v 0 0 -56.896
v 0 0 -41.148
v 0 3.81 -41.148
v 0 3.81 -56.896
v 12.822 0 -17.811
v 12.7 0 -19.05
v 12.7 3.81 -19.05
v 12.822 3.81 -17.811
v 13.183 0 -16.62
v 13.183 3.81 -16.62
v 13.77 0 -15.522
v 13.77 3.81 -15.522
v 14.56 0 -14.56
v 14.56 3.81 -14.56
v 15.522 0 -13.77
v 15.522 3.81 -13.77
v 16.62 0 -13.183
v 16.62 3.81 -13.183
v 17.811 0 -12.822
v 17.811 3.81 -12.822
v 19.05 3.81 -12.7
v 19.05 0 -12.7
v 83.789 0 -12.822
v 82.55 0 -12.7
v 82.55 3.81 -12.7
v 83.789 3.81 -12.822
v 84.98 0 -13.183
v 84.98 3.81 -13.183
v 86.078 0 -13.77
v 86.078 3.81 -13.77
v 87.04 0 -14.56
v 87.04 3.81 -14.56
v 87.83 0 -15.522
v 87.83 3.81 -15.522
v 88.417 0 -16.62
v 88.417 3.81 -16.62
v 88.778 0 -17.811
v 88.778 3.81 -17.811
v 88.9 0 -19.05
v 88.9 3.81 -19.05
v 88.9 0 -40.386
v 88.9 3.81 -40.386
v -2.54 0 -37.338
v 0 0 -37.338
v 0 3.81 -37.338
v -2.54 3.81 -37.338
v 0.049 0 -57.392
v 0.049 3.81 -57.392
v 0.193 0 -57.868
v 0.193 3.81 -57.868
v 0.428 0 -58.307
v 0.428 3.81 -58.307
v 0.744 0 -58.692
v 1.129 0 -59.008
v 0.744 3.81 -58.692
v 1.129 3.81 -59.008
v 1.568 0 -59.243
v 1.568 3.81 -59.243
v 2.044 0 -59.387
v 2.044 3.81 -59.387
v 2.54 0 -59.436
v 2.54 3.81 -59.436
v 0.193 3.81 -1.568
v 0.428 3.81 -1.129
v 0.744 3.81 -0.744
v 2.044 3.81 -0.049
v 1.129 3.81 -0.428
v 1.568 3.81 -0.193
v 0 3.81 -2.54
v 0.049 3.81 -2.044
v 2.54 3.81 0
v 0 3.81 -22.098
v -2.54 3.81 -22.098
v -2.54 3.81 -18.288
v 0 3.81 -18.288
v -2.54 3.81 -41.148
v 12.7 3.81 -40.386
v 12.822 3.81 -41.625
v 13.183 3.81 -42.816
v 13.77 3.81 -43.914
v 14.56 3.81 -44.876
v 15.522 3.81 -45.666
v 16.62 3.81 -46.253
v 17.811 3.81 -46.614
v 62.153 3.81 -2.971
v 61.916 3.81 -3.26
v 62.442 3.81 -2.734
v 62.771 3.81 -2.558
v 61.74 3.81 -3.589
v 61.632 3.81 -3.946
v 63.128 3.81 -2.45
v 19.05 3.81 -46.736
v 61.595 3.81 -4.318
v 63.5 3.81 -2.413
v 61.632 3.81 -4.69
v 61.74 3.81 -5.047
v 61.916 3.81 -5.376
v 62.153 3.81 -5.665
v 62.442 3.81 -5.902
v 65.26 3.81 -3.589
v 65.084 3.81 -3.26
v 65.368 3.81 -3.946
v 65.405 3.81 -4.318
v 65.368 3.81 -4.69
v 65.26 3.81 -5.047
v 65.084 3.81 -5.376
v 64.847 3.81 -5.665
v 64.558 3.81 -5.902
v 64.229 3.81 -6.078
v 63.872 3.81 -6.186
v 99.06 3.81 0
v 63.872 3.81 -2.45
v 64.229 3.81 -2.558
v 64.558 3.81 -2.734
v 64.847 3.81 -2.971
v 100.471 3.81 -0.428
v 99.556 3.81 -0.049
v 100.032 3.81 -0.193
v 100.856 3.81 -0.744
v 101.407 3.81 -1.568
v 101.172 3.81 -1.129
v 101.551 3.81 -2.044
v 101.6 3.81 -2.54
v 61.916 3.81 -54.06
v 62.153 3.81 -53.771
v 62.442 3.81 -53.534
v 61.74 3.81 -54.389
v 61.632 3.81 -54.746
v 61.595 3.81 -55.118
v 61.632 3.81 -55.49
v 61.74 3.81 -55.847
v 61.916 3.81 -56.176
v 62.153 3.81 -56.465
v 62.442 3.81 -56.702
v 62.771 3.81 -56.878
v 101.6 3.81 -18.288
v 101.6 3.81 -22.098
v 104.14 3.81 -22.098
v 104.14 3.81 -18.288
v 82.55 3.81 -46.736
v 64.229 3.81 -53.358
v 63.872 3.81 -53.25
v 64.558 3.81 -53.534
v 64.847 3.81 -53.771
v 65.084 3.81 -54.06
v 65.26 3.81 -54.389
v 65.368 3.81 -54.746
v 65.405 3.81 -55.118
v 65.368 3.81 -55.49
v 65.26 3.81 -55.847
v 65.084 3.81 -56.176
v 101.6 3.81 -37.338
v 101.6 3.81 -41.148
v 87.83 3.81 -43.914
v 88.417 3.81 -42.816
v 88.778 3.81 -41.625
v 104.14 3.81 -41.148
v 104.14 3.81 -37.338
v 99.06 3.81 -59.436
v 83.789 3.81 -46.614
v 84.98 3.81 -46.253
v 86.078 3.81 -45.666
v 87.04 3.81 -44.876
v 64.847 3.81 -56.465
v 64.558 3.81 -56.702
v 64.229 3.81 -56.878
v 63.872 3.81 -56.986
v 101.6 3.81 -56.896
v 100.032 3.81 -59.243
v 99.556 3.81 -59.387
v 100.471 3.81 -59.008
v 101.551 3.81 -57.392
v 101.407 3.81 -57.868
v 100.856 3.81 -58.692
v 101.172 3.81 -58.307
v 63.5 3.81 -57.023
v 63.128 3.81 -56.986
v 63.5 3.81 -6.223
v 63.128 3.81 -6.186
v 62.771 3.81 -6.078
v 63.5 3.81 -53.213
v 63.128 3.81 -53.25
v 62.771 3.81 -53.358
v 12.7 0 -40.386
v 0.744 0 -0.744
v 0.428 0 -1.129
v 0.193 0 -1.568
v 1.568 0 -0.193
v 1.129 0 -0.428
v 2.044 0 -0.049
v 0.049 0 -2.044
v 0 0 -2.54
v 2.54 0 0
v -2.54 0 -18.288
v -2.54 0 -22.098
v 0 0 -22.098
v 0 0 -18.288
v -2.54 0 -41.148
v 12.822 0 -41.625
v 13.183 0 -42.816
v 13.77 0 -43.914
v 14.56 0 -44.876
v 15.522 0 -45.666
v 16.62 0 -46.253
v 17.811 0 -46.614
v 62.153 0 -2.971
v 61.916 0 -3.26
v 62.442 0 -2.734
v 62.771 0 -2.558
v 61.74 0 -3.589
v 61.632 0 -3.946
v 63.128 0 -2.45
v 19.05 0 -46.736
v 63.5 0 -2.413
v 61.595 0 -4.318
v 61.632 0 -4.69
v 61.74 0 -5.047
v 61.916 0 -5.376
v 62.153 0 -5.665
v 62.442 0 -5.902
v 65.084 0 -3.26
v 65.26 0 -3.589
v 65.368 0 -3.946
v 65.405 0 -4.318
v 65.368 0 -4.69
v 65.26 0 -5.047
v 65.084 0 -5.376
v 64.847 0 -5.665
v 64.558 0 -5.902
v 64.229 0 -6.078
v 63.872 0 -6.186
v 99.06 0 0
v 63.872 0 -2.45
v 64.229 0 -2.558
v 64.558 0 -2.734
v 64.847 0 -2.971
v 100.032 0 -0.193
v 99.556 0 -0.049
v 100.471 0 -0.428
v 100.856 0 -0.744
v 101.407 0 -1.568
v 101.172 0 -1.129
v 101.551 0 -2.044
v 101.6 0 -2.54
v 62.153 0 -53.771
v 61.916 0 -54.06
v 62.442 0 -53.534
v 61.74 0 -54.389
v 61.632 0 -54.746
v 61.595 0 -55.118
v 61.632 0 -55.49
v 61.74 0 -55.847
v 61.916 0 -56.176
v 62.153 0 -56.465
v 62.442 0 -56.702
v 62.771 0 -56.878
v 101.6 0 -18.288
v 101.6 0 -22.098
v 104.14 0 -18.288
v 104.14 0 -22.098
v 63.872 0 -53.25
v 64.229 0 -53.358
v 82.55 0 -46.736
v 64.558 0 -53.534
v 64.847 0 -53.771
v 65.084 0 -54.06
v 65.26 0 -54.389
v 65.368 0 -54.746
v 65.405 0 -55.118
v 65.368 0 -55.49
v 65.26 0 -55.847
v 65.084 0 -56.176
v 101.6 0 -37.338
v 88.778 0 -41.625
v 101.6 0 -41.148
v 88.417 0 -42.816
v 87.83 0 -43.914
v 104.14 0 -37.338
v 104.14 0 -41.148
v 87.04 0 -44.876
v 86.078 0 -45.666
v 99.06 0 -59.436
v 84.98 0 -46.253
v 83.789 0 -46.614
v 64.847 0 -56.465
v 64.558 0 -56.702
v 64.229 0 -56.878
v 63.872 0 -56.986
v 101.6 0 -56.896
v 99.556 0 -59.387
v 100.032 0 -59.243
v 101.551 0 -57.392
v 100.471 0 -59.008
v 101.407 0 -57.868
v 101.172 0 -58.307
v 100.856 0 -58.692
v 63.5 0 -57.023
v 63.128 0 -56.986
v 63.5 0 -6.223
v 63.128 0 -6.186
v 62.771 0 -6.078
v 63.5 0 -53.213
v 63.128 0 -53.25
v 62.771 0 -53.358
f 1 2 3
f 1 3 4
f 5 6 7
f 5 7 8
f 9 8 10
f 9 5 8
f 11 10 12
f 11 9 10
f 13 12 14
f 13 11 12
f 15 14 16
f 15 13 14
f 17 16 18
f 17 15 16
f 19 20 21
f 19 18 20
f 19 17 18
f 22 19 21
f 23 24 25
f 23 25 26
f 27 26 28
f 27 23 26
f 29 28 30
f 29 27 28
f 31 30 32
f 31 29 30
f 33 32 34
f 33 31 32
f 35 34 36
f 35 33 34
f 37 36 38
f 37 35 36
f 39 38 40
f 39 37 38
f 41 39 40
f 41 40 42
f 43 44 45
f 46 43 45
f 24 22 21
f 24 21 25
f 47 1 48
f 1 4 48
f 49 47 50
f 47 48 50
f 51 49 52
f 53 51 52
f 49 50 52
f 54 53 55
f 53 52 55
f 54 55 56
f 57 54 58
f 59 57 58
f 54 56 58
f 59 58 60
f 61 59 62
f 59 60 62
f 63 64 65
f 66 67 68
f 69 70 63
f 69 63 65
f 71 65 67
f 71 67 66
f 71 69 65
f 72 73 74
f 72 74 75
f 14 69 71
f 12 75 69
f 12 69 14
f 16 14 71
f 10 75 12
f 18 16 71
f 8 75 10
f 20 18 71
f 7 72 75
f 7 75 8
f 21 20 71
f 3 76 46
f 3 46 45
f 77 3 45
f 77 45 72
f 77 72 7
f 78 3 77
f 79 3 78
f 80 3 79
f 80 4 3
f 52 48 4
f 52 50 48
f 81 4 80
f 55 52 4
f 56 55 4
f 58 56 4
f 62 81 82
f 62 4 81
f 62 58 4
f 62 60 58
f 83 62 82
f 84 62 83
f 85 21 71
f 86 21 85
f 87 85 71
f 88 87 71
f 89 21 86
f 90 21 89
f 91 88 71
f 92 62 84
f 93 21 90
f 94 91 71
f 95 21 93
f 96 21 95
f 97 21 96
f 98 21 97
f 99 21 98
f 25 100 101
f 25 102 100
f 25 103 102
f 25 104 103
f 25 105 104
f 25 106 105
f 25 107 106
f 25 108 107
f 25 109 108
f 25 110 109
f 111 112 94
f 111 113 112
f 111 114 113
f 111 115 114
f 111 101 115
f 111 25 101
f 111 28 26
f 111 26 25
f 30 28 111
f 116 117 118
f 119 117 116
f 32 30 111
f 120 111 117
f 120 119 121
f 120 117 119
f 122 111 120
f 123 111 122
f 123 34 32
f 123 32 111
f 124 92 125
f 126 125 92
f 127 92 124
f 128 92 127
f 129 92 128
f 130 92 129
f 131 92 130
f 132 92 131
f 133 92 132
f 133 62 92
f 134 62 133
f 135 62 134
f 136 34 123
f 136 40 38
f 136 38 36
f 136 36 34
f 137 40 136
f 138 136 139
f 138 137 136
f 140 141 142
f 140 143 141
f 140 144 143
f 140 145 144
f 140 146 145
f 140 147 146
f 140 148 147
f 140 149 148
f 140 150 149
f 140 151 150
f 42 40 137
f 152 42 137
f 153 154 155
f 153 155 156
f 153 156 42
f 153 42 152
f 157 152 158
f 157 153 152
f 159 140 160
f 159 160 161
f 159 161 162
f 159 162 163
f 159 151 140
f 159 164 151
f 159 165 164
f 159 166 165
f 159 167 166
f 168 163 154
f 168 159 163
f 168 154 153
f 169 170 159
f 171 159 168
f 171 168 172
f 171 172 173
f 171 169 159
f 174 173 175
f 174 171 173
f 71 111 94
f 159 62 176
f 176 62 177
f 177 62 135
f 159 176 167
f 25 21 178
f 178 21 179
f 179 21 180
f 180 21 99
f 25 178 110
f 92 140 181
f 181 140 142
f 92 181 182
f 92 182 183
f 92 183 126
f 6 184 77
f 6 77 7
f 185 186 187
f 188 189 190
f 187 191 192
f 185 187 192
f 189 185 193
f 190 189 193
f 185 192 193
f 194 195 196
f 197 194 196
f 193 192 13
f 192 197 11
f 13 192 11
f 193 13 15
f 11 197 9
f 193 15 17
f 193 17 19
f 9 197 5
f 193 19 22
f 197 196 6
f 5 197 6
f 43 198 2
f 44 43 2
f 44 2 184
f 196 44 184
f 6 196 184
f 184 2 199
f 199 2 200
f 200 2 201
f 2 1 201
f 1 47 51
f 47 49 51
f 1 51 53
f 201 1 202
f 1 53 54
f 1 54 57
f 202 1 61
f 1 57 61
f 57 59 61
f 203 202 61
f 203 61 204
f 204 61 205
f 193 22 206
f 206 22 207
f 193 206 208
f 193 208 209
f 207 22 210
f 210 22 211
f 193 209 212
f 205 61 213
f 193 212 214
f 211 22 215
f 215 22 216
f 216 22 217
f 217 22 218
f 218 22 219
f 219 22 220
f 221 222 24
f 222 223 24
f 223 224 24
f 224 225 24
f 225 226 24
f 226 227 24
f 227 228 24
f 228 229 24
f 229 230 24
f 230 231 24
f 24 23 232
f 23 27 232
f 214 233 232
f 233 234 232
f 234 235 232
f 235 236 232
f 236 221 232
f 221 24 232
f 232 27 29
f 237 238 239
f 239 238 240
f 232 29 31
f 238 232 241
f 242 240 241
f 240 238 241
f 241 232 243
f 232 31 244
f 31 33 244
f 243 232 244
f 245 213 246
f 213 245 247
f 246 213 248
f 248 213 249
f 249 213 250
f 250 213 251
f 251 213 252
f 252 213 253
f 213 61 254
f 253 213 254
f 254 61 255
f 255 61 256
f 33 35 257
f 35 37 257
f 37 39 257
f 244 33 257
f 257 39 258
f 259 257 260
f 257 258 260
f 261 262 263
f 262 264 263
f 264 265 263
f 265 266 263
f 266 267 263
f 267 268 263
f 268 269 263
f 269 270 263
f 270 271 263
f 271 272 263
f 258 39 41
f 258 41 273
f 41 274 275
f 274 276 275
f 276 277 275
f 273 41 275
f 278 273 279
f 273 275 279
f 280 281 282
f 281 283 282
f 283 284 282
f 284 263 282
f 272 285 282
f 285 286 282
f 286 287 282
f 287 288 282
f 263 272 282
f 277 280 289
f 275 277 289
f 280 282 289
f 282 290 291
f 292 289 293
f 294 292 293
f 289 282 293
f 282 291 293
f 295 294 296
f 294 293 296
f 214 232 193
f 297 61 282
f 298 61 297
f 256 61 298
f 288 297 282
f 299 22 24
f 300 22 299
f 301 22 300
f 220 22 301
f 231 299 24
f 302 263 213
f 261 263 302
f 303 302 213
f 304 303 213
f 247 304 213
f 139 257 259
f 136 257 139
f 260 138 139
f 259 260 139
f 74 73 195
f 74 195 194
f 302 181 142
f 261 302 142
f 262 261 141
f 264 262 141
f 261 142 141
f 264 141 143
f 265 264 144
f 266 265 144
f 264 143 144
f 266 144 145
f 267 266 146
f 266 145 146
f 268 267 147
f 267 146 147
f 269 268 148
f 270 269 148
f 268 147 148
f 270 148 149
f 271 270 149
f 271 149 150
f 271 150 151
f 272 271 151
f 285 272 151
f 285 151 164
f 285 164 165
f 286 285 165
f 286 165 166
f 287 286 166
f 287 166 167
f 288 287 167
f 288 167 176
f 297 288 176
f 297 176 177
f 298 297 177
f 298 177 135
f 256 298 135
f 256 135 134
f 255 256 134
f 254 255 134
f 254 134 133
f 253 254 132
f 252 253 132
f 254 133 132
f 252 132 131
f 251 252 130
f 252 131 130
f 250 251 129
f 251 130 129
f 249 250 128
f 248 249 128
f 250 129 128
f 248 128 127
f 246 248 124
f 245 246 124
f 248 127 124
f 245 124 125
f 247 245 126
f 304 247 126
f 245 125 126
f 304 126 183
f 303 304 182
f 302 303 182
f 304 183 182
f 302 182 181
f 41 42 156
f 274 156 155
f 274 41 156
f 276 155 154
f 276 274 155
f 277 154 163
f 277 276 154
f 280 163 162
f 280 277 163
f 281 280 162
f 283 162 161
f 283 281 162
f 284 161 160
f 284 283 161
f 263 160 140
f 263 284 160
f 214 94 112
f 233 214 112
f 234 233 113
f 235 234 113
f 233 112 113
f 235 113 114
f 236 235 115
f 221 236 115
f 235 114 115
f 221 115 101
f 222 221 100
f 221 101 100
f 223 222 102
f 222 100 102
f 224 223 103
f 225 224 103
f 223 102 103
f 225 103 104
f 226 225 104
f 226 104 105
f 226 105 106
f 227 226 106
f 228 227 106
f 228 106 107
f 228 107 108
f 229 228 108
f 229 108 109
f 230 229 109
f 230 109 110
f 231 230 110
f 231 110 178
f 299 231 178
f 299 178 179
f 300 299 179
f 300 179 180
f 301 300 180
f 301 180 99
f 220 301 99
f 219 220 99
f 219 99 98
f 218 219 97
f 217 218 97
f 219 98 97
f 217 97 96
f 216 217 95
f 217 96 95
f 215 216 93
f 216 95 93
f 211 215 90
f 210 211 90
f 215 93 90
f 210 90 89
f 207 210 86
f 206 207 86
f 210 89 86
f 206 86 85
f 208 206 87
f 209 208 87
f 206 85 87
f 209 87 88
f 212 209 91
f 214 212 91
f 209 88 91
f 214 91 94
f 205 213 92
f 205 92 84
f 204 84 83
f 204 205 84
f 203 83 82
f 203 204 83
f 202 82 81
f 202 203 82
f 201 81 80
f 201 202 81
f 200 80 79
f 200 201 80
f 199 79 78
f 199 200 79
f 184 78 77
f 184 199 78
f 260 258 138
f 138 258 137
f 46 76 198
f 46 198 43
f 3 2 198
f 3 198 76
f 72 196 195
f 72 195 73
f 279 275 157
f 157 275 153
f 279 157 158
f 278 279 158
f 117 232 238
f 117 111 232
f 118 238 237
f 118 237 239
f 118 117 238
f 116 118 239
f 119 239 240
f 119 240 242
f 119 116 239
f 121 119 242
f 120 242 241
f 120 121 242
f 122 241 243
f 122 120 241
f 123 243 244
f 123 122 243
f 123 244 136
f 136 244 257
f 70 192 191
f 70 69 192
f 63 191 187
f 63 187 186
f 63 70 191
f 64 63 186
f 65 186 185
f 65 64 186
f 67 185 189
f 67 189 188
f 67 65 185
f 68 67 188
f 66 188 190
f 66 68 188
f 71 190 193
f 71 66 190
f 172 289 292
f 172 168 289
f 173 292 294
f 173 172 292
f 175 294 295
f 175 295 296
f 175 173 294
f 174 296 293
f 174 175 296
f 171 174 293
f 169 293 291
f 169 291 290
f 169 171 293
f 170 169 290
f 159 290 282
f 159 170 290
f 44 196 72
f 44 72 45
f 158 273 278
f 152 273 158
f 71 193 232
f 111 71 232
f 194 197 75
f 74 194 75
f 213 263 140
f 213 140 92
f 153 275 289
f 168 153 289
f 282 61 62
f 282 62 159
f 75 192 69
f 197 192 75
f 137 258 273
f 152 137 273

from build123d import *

# Parameters (mm, degrees)
SKETCH1_W                       = 101.6
SKETCH1_H                       = 59.436
BASE_EXTRUDE_DEPTH              = 3.81
BASE_CORNER_FILLET_R            = 2.54
SKETCH3_W                       = 3.81
SKETCH3_H                       = 3.81
PEG_EXTRUDE_DEPTH               = 2.54
MATERIAL_REMOVAL_CUT_DEPTH      = 120.96788652
SKETCH5_R                       = 1.905
REMOTE_CONTROL_HOLDER_CUT_DEPTH = 120.96788652


with BuildPart() as part:
    # Sketch1 → Base Extrude (new body)
    with BuildSketch(Plane(origin=(0, 0, 0), x_dir=(1, 0, 0), z_dir=(0, 1, 0))):
        with Locations((50.8, 29.718)):
            Rectangle(SKETCH1_W, SKETCH1_H)
    extrude(amount=BASE_EXTRUDE_DEPTH)

    # Base Corner Fillet
    base_corner_fillet_edges = [part.edges().sort_by_distance(p)[0] for p in [
        (0, 1.905, -59.436),
        (101.6, 1.905, -59.436),
        (101.6, 1.905, 0),
        (0, 1.905, 0),
    ]]
    fillet(base_corner_fillet_edges, radius=BASE_CORNER_FILLET_R)

    # Sketch3 → Peg Extrude (add)
    with BuildSketch(Plane.ZY):
        with Locations((-20.193, 1.905)):
            Rectangle(SKETCH3_W, SKETCH3_H)
        with Locations((-39.243, 1.905)):
            Rectangle(SKETCH3_W, SKETCH3_H)
    peg_extrude = extrude(amount=PEG_EXTRUDE_DEPTH)

    # Peg Mirror: Peg Extrude across plane
    add(peg_extrude.mirror(Plane(origin=(50.8, 0, 0), x_dir=(0, 0, 1), z_dir=(1, 0, 0))))

    # Sketch4 → Material Removal Cut (cut, through all)
    with BuildSketch(Plane.XZ):
        with BuildLine():
            Line((19.05, -12.7), (82.55, -12.7))
            ThreePointArc((82.55, -12.7), (87.040128061, -14.559871939), (88.9, -19.05))
            Line((88.9, -19.05), (88.9, -40.386))
            ThreePointArc((88.9, -40.386), (87.040128061, -44.876128061), (82.55, -46.736))
            Line((82.55, -46.736), (19.05, -46.736))
            ThreePointArc((19.05, -46.736), (14.559871939, -44.876128061), (12.7, -40.386))
            Line((12.7, -40.386), (12.7, -19.05))
            ThreePointArc((12.7, -19.05), (14.559871939, -14.559871939), (19.05, -12.7))
        make_face()
    extrude(amount=-MATERIAL_REMOVAL_CUT_DEPTH, mode=Mode.SUBTRACT)

    # Sketch5 → Remote Control Holder Cut (cut, through all)
    with BuildSketch(Plane(origin=(0, 3.81, 0), x_dir=(1, 0, 0), z_dir=(0, 1, 0))):
        with Locations(Location((63.5, 4.318, 0), (0, 0, 270))):
            Circle(SKETCH5_R)
        with Locations(Location((63.5, 55.118, 0), (0, 0, 270))):
            Circle(SKETCH5_R)
    extrude(amount=-REMOTE_CONTROL_HOLDER_CUT_DEPTH, mode=Mode.SUBTRACT)


solid = part.part
